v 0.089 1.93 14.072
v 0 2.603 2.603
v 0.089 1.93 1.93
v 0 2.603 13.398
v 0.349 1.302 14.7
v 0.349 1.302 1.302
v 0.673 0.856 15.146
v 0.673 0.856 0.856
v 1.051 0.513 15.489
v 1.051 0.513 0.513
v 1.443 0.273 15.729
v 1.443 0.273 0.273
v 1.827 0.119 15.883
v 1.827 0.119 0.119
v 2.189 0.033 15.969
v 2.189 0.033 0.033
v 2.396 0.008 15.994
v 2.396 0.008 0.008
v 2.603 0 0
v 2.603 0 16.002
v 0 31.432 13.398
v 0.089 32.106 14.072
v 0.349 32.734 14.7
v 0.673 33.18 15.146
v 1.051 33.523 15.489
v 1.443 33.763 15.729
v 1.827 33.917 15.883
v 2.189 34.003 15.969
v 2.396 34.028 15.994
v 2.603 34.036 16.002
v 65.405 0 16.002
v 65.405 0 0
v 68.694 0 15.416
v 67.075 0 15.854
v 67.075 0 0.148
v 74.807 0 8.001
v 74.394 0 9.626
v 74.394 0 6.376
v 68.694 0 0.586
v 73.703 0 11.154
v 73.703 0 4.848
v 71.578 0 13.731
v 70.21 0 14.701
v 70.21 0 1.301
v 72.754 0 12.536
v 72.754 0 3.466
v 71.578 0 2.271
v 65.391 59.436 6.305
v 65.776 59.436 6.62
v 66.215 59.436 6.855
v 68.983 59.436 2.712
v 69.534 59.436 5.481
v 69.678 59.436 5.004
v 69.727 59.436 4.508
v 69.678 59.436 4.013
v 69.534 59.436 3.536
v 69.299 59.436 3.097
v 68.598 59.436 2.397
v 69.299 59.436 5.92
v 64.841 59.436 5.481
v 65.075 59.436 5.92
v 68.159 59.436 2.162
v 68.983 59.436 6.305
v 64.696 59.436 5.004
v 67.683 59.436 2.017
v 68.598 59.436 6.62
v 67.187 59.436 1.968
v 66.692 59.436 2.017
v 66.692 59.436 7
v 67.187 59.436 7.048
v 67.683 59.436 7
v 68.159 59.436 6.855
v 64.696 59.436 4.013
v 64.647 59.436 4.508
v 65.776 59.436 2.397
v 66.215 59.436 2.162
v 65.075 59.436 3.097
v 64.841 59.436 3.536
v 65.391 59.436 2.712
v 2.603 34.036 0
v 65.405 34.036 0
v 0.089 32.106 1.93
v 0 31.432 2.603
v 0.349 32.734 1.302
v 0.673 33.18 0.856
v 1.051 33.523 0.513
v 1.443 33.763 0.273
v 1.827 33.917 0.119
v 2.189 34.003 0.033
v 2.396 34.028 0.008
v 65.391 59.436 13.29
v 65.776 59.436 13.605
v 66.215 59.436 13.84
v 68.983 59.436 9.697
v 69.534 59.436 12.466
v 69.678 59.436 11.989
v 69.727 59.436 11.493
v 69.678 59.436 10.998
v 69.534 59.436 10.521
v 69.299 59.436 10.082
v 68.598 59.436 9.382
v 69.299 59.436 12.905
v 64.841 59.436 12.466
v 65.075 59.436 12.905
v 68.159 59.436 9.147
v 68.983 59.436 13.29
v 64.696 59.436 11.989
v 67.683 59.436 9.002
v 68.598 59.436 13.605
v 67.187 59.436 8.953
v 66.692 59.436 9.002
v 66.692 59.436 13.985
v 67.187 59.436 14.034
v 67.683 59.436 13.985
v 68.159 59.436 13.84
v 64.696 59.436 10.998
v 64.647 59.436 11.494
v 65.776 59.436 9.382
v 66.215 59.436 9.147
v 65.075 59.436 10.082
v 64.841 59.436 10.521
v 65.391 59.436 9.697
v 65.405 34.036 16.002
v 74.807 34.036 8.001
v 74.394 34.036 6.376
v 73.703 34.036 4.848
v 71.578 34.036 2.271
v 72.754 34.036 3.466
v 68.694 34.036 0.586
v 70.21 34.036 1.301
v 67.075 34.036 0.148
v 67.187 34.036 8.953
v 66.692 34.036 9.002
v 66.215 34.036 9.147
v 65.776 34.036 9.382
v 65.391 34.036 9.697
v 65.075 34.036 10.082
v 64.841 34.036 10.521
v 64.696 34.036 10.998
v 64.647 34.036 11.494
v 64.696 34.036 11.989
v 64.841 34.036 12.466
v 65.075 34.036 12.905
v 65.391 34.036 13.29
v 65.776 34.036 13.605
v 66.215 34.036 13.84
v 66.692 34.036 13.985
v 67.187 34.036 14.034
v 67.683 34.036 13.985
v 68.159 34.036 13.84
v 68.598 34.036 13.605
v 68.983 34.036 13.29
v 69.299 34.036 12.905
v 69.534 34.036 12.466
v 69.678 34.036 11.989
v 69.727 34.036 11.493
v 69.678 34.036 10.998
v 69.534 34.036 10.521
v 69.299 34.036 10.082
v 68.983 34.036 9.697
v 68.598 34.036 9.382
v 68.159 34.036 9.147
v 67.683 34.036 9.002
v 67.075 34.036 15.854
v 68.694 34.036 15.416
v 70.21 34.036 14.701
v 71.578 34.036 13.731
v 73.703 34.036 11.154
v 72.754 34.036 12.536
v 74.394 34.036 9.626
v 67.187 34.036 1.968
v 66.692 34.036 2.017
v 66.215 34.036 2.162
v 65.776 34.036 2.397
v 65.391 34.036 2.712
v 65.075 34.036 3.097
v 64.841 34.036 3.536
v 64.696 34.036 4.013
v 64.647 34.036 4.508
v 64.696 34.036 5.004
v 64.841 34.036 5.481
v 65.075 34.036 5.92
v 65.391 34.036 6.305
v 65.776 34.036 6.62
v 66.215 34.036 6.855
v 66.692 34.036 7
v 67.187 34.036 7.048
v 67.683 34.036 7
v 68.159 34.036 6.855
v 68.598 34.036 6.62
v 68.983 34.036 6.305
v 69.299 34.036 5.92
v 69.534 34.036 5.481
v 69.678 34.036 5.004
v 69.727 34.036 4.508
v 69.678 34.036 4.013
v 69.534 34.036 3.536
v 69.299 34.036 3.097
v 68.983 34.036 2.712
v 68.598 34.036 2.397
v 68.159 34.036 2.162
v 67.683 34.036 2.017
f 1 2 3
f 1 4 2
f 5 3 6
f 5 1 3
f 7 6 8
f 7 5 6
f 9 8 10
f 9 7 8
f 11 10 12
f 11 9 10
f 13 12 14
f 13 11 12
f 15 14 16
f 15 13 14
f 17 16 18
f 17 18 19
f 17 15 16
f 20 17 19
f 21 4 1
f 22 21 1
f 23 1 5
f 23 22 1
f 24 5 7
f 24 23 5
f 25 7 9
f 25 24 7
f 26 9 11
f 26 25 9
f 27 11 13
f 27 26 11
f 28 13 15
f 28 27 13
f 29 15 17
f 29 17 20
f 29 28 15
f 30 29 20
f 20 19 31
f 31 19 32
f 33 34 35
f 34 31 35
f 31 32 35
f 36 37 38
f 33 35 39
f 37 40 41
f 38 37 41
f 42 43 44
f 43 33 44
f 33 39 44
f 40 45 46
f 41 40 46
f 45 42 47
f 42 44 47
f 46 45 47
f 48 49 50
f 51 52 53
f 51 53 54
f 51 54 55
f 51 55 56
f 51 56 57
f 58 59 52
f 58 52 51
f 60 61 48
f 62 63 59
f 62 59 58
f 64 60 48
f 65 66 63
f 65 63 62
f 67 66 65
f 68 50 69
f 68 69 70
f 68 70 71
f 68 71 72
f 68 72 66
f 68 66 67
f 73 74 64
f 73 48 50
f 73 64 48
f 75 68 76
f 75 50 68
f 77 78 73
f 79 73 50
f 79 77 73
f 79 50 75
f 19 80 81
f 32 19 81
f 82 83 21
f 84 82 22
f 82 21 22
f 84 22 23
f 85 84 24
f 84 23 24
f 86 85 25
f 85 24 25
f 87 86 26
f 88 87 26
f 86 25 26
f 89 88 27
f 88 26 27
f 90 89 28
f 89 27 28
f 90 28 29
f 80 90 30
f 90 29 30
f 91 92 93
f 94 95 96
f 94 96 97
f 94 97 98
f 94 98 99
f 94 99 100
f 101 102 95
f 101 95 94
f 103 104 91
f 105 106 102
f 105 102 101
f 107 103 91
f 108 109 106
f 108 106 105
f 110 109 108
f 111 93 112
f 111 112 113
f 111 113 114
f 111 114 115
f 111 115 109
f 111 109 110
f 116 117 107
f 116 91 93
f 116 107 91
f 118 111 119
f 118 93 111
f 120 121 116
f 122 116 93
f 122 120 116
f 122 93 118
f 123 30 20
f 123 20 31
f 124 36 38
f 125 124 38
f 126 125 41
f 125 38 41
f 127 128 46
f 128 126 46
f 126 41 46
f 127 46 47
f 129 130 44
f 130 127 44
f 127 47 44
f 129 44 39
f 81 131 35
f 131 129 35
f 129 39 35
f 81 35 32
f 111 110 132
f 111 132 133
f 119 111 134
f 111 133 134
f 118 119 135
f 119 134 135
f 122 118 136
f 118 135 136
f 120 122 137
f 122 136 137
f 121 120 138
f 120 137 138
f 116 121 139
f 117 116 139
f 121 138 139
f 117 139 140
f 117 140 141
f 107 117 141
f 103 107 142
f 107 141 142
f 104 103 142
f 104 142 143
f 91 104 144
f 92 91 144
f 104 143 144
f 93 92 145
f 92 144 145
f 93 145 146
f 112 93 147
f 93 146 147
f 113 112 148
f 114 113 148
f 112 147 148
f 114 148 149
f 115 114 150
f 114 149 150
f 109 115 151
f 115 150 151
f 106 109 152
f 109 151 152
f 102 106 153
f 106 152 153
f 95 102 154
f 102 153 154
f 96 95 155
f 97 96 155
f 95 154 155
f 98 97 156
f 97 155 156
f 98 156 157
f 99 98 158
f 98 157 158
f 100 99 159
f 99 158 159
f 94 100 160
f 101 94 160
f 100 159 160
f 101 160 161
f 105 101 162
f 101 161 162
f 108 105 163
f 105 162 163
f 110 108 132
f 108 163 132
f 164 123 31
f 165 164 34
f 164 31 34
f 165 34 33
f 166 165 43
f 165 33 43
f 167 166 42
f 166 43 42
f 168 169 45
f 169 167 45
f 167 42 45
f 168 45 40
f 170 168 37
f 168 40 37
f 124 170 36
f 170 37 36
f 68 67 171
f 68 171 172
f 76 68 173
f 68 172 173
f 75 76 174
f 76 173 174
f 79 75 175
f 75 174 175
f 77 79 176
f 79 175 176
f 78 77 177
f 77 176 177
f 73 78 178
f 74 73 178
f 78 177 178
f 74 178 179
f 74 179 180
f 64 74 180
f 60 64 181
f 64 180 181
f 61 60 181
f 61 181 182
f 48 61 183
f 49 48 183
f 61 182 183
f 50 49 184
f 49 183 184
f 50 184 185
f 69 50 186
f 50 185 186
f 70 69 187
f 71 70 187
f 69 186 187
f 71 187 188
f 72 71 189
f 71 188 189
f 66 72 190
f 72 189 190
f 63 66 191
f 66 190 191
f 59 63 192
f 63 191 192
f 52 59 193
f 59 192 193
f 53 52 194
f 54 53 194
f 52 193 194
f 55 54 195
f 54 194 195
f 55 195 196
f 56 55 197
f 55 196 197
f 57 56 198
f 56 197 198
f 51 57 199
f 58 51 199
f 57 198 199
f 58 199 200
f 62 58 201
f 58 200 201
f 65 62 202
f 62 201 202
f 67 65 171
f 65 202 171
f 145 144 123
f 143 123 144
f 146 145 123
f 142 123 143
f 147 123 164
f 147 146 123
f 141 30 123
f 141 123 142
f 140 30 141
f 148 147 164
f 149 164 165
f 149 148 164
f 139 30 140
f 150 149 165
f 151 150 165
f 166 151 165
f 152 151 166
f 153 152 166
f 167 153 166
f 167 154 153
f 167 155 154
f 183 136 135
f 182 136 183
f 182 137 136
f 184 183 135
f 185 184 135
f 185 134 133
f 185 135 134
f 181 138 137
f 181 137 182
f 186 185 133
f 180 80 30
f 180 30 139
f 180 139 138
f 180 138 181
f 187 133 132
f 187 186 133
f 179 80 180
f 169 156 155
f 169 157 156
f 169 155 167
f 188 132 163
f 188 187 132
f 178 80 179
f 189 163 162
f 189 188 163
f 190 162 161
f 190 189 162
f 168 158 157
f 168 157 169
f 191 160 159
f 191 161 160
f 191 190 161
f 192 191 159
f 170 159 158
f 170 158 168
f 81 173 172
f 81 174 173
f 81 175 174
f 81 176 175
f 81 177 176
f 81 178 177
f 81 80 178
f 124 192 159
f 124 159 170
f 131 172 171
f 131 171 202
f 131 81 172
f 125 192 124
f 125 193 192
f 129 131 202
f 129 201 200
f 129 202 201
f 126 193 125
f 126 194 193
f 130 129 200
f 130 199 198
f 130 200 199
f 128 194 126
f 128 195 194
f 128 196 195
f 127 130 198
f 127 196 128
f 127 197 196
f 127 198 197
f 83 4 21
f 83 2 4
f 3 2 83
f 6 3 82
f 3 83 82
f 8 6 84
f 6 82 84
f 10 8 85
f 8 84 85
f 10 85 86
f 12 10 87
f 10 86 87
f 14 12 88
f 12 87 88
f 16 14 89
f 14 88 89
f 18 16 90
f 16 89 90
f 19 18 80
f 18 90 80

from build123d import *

# Parameters (mm, degrees)
SKETCH1_W           = 74.93
SKETCH1_H           = 34.036
BOSS_EXTRUDE1_DEPTH = 16.002
FILLET1_R           = 9.525
SKETCH2_R           = 2.54
BOSS_EXTRUDE2_DEPTH = 25.4
FILLET2_R           = 2.6035


with BuildPart() as part:
    # Sketch1 → Boss-Extrude1 (new body)
    with BuildSketch(Plane.XY):
        with Locations((37.465, 17.018)):
            Rectangle(SKETCH1_W, SKETCH1_H)
    extrude(amount=BOSS_EXTRUDE1_DEPTH)

    # Fillet1
    # the kernel refuses this fillet: 9.525 mm, written as the material it takes off along each edge
    with BuildSketch(Plane(origin=(74.93, -23.8125, 16.002), x_dir=(0, 0, -1), z_dir=(0, 1, 0))) as fillet1_piece_1:
        with BuildLine():
            CenterArc((FILLET1_R, FILLET1_R), FILLET1_R, 180, 90)
            Line((0, FILLET1_R), (0, 0))
            Line((0, 0), (FILLET1_R, 0))
        make_face()
    extrude(amount=81.661, mode=Mode.SUBTRACT)
    with BuildSketch(Plane(origin=(74.93, -23.8125, 0), x_dir=(0, 0, 1), z_dir=(0, 1, 0))) as fillet1_piece_2:
        with BuildLine():
            CenterArc((FILLET1_R, -FILLET1_R), FILLET1_R, 90, 90)
            Line((0, -FILLET1_R), (0, 0))
            Line((0, 0), (FILLET1_R, 0))
        make_face()
    extrude(amount=81.661, mode=Mode.SUBTRACT)

    # Sketch2 → Boss-Extrude2 (add)
    with BuildSketch(Plane(origin=(0, 34.036, 0), x_dir=(1, 0, 0), z_dir=(0, 1, 0))):
        with Locations(Location((67.187289562, -4.5085, 0), (0, 0, 90))):
            Circle(SKETCH2_R)
        with Locations(Location((67.187289562, -11.4935, 0), (0, 0, 90))):
            Circle(SKETCH2_R)
    extrude(amount=BOSS_EXTRUDE2_DEPTH)

    # Fillet2
    fillet2_edges = [part.edges().sort_by_distance(p)[0] for p in [
        (0, 17.018, 16.002),
        (0, 17.018, 0),
        (0, 34.036, 8.001),
        (0, 0, 8.001),
    ]]
    fillet(fillet2_edges, radius=FILLET2_R)


solid = part.part
